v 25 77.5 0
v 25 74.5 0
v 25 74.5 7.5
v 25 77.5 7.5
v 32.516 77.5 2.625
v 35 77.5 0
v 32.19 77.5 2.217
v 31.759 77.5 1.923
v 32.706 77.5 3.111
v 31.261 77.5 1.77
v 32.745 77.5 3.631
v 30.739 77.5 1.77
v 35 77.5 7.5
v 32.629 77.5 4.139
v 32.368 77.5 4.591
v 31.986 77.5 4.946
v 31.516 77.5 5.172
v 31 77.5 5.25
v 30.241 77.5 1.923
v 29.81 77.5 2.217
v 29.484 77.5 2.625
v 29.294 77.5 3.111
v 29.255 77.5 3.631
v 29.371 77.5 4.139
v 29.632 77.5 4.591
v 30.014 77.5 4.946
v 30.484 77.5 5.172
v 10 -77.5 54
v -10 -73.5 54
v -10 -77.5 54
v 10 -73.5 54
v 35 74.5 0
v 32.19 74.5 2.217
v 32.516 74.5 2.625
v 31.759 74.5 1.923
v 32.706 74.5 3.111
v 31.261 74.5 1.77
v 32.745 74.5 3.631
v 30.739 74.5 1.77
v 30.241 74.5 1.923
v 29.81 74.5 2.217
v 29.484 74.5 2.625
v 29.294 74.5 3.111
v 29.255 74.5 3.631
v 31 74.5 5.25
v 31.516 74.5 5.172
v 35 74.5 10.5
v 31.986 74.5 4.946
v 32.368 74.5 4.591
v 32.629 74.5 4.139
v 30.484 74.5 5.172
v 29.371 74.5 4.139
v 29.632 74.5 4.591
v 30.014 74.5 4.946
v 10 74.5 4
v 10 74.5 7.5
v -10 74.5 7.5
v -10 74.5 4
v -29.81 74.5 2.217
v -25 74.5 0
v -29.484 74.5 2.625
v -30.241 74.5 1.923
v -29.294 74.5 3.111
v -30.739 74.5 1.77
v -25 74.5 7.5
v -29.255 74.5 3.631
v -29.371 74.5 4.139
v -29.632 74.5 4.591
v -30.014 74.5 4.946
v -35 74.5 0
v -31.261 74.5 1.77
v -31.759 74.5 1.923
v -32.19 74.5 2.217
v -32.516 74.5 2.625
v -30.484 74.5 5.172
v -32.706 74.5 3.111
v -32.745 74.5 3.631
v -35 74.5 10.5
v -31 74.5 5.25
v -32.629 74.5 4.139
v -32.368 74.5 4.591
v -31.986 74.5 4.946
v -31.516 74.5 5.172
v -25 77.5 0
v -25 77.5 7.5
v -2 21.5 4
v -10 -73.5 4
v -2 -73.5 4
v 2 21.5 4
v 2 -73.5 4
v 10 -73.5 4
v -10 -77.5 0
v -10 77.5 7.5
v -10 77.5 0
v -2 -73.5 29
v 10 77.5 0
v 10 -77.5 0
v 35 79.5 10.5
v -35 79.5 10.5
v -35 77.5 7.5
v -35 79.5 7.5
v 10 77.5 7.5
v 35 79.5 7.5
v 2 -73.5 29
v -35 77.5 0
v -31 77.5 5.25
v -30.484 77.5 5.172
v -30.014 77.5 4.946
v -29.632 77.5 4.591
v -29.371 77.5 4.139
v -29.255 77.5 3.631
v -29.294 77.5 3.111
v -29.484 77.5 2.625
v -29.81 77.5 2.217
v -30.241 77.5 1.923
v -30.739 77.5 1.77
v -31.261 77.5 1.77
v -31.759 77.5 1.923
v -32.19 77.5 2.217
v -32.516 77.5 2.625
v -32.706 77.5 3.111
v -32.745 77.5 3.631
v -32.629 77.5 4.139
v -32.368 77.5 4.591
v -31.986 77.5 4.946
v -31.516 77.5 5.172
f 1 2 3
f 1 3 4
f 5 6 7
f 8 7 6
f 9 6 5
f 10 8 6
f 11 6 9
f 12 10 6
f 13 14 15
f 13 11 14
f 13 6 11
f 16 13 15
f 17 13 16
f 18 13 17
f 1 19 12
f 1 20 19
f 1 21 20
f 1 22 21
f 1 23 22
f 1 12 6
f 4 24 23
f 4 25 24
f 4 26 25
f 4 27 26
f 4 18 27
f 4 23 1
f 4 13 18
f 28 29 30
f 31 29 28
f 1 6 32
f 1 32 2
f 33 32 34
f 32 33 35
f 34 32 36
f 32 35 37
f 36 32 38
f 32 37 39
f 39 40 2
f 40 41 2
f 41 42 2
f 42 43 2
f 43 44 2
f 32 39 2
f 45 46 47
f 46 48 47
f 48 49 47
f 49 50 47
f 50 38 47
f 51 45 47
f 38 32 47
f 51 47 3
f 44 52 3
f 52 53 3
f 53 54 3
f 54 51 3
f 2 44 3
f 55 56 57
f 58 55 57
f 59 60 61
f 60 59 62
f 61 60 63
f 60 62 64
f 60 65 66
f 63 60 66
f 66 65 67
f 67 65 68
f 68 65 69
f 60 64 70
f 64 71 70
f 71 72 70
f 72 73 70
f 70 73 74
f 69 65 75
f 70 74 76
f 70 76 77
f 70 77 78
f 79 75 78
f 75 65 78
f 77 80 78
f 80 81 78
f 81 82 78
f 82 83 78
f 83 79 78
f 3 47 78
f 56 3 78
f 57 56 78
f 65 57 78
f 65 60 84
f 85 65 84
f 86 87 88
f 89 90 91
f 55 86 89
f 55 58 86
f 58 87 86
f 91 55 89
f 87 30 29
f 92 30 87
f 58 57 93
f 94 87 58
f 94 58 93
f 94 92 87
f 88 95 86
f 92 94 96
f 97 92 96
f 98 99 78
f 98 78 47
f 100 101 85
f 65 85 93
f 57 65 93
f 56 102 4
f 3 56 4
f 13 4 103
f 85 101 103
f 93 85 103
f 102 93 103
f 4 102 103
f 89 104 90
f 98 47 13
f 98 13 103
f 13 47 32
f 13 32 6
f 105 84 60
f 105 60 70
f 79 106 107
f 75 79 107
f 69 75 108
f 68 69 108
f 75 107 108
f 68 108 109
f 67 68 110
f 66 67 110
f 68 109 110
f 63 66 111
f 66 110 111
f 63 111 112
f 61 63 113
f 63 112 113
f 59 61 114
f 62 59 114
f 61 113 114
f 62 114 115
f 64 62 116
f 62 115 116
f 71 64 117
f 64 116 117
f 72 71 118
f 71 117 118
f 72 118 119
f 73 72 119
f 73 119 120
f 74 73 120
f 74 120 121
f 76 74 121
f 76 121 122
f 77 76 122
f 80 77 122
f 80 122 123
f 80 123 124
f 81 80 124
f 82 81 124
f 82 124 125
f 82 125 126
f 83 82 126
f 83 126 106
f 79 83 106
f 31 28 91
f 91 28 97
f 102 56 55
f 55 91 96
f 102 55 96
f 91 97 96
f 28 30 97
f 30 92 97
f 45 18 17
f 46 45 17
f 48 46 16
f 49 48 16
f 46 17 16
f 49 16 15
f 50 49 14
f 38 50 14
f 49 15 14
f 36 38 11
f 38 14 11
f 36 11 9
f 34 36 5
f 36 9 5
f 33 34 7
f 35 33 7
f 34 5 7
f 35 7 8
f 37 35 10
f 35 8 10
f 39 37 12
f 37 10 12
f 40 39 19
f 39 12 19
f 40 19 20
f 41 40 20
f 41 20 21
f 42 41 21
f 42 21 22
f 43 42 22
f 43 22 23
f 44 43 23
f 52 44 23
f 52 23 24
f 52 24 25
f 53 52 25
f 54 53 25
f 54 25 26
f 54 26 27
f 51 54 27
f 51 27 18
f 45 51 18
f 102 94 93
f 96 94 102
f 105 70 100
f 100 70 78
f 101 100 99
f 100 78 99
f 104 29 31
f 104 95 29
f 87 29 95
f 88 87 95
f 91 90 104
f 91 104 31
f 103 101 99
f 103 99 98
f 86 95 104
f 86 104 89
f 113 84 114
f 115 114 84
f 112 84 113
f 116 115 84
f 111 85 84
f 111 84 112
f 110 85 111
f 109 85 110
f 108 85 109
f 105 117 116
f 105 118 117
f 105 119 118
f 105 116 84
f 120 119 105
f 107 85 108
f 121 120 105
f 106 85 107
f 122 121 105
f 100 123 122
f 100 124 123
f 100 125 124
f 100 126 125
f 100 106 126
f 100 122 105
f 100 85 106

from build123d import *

# Parameters (mm, degrees)
SKETCH1_W           = 20
SKETCH1_H           = 155
BOSS_EXTRUDE1_DEPTH = 4
SKETCH2_W           = 20
SKETCH2_H           = 4
BOSS_EXTRUDE3_DEPTH = 50
RIB2_REACH          = 96.986
SKETCH7_WALL_W      = 290.205463948
SKETCH7_WALL_H      = 4
SKETCH8_W           = 20
SKETCH8_H           = 3
BOSS_EXTRUDE4_DEPTH = 3.5
SKETCH9_W           = 70
SKETCH9_H           = 5
BOSS_EXTRUDE6_DEPTH = 3
SKETCH10_W          = 10
SKETCH10_H          = 3
BOSS_EXTRUDE7_DEPTH = 7.5
SKETCH12_R          = 1.75
CUT_EXTRUDE1_DEPTH  = 10


with BuildPart() as part:
    # Sketch1 → Boss-Extrude1 (new body)
    with BuildSketch(Plane.XY):
        Rectangle(SKETCH1_W, SKETCH1_H)
    extrude(amount=BOSS_EXTRUDE1_DEPTH)

    # Sketch2 → Boss-Extrude3 (add)
    with BuildSketch(Plane.XY.offset(4)):
        with Locations((0, -75.5)):
            Rectangle(SKETCH2_W, SKETCH2_H)
    extrude(amount=BOSS_EXTRUDE3_DEPTH)

    # Sketch7 wall → Rib2 (add, up to next)
    with BuildSketch(Plane(origin=(0, -26, 16.5), x_dir=(0, 0.967074537263, -0.25449329928), z_dir=(0, 0.25449329928, 0.967074537263)), mode=Mode.PRIVATE) as rib2_sk1:
        Rectangle(SKETCH7_WALL_W, SKETCH7_WALL_H)
    rib2_tool1 = extrude(rib2_sk1.sketch, amount=-RIB2_REACH, mode=Mode.PRIVATE) - part.part
    add(rib2_tool1.solids().sort_by_distance((0, -26, 16.5))[0])

    # Sketch8 → Boss-Extrude4 (add)
    with BuildSketch(Plane.XY.offset(4)):
        with Locations((0, 76)):
            Rectangle(SKETCH8_W, SKETCH8_H)
    extrude(amount=BOSS_EXTRUDE4_DEPTH)

    # Sketch9 → Boss-Extrude6 (add)
    with BuildSketch(Plane.XY.offset(7.5)):
        with Locations((0, 77)):
            Rectangle(SKETCH9_W, SKETCH9_H)
    extrude(amount=BOSS_EXTRUDE6_DEPTH)

    # Sketch10 → Boss-Extrude7 (add)
    with BuildSketch(Plane(origin=(0, 0, 7.5), x_dir=(-1, 0, 0), z_dir=(0, 0, -1))):
        with Locations((30, 76)):
            Rectangle(SKETCH10_W, SKETCH10_H)
        with Locations((-30, 76)):
            Rectangle(SKETCH10_W, SKETCH10_H)
    extrude(amount=BOSS_EXTRUDE7_DEPTH)

    # Sketch12 → Cut-Extrude1 (cut)
    with BuildSketch(Plane(origin=(0, 77.5, 0), x_dir=(1, 0, 0), z_dir=(0, 1, 0))):
        with Locations(Location((-31, -3.5, 0), (0, 0, 270))):
            Circle(SKETCH12_R)
        with Locations(Location((31, -3.5, 0), (0, 0, 270))):
            Circle(SKETCH12_R)
    extrude(amount=-CUT_EXTRUDE1_DEPTH, mode=Mode.SUBTRACT)


solid = part.part
